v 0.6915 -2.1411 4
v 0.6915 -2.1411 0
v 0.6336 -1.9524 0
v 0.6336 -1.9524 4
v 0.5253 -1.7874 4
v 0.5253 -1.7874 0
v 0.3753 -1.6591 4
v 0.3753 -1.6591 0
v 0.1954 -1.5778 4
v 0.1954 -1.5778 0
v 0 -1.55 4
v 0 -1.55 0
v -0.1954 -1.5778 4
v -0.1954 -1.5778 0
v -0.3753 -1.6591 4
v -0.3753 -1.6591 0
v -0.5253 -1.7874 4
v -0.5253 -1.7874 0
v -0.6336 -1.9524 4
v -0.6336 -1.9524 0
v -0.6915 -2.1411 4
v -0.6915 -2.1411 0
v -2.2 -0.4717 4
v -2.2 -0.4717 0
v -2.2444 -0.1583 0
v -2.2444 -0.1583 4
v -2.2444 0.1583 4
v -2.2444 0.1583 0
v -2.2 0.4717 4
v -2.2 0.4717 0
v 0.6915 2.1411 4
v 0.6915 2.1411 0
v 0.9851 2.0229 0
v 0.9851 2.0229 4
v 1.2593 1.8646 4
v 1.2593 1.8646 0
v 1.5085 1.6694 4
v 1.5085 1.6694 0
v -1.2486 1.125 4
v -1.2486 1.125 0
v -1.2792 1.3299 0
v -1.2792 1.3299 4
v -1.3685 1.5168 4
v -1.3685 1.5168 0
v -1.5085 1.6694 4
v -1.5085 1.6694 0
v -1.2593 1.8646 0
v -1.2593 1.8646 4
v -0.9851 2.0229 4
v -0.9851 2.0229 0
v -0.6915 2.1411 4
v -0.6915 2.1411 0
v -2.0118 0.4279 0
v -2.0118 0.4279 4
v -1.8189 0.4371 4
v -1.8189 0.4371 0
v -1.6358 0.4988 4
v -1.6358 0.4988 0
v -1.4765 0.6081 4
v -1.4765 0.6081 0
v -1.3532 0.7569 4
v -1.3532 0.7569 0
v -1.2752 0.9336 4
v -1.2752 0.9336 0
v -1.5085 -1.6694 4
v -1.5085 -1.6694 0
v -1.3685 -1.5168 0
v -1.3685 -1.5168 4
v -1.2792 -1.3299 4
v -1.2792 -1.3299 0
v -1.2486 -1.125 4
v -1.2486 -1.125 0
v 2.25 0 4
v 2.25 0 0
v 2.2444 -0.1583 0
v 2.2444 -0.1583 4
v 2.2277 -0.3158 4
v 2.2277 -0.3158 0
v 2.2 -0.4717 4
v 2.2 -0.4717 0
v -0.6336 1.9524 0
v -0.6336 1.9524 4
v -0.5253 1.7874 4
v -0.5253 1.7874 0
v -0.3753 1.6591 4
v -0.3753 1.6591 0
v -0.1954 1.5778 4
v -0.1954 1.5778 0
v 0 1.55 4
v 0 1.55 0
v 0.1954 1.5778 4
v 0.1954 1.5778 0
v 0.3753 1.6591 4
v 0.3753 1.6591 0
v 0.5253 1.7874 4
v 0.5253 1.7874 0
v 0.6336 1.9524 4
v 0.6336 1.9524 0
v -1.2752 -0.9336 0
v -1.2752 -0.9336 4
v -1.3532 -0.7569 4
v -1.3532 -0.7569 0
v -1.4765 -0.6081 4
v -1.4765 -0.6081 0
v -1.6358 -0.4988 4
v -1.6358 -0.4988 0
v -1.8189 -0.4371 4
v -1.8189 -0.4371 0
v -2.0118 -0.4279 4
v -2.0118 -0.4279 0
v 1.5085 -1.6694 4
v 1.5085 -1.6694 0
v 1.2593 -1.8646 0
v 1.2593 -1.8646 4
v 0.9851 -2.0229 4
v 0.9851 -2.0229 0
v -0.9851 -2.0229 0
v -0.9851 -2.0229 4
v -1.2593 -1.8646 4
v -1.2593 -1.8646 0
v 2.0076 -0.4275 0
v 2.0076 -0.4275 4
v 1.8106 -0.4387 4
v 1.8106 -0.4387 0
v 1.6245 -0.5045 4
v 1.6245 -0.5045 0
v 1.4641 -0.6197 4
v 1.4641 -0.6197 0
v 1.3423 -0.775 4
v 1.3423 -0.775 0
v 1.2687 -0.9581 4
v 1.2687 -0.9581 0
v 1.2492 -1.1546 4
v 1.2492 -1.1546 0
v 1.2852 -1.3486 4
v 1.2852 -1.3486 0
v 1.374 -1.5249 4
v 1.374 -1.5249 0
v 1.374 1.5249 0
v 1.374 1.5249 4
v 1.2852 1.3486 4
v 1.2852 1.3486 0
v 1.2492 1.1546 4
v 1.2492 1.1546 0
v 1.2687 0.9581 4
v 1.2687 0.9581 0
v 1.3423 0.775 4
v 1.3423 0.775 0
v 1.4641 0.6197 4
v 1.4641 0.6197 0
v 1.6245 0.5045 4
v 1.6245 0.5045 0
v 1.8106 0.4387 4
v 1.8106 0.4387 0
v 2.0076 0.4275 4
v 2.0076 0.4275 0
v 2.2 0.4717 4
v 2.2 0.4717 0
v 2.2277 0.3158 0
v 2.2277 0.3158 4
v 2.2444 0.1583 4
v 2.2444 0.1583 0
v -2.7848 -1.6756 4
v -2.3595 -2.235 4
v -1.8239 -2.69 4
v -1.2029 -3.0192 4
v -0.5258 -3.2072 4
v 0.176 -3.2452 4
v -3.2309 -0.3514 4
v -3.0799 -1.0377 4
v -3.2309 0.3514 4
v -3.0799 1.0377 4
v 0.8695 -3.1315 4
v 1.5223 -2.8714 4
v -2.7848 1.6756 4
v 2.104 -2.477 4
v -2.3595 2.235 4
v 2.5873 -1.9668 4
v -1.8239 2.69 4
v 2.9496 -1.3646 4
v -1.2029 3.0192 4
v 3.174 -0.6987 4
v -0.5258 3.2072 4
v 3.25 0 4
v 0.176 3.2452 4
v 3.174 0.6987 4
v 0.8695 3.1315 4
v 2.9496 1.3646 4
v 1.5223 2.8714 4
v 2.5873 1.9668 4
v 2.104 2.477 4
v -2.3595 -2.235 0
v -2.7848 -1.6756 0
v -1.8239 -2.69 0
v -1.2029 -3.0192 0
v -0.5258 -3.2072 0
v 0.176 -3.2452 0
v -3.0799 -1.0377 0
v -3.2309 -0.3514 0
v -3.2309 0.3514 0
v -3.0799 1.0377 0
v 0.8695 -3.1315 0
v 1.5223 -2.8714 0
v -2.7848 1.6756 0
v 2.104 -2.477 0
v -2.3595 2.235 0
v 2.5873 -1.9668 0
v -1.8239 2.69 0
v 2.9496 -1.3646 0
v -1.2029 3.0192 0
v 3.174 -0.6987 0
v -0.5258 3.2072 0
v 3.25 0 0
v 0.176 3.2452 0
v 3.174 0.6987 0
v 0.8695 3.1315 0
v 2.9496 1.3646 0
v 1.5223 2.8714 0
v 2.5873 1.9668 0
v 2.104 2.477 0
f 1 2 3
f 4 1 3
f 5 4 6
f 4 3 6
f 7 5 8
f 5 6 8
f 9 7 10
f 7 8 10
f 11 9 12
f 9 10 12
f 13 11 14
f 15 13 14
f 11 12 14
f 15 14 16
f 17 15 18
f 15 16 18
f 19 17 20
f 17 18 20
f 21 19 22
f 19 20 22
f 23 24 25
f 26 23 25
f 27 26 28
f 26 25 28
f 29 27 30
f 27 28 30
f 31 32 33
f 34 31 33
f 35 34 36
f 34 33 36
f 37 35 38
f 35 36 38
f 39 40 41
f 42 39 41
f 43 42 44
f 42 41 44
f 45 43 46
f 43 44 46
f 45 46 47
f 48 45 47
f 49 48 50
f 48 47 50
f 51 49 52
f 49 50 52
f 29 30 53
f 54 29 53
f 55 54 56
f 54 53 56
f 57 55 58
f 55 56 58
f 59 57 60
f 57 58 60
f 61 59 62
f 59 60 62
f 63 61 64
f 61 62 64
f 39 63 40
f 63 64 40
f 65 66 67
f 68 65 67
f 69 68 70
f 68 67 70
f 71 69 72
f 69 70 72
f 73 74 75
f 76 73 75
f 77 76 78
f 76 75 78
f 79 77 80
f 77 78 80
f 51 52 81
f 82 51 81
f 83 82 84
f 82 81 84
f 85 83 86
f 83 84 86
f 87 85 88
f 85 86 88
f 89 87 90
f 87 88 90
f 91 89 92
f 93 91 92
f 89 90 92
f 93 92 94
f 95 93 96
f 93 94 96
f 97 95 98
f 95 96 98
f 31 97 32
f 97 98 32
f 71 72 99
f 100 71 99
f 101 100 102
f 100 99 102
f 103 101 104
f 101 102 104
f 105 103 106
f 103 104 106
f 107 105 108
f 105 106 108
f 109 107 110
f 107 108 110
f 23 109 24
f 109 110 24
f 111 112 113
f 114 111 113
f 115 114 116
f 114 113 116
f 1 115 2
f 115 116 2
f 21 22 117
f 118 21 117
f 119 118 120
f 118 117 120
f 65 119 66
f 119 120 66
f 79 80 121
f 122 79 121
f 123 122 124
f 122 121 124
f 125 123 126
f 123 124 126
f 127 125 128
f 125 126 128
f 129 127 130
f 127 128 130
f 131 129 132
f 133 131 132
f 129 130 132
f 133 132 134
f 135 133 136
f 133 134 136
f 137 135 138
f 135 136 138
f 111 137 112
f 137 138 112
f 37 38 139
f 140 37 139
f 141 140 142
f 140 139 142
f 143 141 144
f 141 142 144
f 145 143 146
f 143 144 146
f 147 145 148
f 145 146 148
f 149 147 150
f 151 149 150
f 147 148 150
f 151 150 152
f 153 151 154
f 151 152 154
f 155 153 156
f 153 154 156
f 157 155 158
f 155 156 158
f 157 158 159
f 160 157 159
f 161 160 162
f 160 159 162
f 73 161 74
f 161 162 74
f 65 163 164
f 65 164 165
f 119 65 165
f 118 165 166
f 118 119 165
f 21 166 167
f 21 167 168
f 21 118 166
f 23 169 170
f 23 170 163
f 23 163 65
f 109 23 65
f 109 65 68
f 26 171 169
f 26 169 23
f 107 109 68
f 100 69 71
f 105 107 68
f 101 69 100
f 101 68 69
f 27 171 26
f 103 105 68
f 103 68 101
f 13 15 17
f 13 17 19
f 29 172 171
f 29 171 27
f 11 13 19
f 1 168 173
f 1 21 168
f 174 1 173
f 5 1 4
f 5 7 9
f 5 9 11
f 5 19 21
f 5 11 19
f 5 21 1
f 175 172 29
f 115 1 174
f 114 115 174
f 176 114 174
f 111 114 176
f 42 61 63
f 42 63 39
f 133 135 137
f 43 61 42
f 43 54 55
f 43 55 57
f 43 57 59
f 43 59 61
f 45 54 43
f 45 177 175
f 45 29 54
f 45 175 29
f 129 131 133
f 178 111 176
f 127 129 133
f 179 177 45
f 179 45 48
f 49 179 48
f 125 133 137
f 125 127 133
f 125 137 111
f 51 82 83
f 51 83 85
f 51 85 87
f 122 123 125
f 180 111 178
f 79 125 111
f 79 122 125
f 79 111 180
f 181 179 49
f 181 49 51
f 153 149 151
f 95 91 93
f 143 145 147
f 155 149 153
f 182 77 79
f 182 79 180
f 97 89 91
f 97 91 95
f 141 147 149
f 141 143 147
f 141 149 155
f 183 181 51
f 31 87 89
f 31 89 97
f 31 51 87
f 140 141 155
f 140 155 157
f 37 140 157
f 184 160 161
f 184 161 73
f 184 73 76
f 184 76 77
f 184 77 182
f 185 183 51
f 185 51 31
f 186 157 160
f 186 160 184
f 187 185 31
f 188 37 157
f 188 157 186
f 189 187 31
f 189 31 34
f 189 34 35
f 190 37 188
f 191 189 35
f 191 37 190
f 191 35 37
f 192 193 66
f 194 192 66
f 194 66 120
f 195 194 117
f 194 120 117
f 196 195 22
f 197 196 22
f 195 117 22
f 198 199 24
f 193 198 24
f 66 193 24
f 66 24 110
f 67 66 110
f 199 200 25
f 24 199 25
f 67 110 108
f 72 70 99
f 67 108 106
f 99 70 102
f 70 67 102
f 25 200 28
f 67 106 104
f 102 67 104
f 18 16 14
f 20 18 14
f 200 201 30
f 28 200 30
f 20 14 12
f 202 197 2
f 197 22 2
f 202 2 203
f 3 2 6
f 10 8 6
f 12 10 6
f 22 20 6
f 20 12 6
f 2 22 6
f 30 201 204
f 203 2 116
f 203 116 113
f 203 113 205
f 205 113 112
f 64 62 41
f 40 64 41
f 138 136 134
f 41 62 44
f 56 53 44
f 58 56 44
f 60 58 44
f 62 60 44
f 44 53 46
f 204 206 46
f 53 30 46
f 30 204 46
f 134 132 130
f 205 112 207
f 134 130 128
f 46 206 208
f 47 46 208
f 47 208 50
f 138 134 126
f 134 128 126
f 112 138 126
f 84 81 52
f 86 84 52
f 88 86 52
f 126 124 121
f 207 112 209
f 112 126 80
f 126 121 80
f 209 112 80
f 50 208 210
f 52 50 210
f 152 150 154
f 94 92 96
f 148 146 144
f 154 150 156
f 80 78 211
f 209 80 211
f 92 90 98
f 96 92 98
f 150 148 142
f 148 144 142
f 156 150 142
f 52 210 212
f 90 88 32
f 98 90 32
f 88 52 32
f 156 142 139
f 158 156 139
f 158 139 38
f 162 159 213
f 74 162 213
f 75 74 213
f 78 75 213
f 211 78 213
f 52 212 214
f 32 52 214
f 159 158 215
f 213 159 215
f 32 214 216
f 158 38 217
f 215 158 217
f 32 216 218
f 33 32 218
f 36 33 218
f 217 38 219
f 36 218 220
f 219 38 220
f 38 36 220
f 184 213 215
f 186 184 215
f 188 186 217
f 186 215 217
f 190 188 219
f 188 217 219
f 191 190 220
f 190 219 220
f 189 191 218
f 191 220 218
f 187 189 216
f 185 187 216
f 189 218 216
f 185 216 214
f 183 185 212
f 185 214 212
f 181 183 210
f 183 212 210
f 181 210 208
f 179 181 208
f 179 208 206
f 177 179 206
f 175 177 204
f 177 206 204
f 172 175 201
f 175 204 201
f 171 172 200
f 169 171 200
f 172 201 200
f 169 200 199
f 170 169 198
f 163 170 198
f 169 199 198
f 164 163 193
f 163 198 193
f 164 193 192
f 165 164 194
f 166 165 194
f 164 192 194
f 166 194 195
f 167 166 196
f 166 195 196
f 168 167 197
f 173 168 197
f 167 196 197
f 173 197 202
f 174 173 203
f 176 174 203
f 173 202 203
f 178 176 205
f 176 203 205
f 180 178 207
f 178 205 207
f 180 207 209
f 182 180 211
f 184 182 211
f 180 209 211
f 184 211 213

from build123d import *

# Parameters (mm, degrees)
F0_R     = 3.25
F1_DEPTH = 4


with BuildPart() as f1:
    # F0 (on Top) → F1 (new body)
    with BuildSketch(Plane.XY):
        Circle(F0_R)
        with BuildLine():
            ThreePointArc((2.1999961154, 0.4717171738), (2.2374641069, 0.2371800374), (2.25, 0))
            ThreePointArc((2.25, 0), (2.2374641069, -0.2371800374), (2.1999961154, -0.4717171738))
            ThreePointArc((2.1999961154, -0.4717171738), (2.5256218299, -0.7287723318), (2.6485571585, -1.125))
            ThreePointArc((2.6485571585, -1.125), (2.2501959894, -1.7566755621), (1.5085171137, -1.6693939373))
            ThreePointArc((1.5085171137, -1.6693939373), (1.125, -1.9485571585), (0.6914790018, -2.1411111111))
            ThreePointArc((0.6914790018, -2.1411111111), (0.6978664991, -2.1953891093), (0.7, -2.25))
            ThreePointArc((0.7, -2.25), (-0.0546108907, -2.9478664991), (-0.6914790018, -2.1411111111))
            ThreePointArc((-0.6914790018, -2.1411111111), (-1.125, -1.9485571585), (-1.5085171137, -1.6693939373))
            ThreePointArc((-1.5085171137, -1.6693939373), (-2.5547749412, -1.475), (-2.1999961154, -0.4717171738))
            ThreePointArc((-2.1999961154, -0.4717171738), (-2.25, 0), (-2.1999961154, 0.4717171738))
            ThreePointArc((-2.1999961154, 0.4717171738), (-2.5547749412, 1.475), (-1.5085171137, 1.6693939373))
            ThreePointArc((-1.5085171137, 1.6693939373), (-1.125, 1.9485571585), (-0.6914790018, 2.1411111111))
            ThreePointArc((-0.6914790018, 2.1411111111), (-0.0546108907, 2.9478664991), (0.7, 2.25))
            ThreePointArc((0.7, 2.25), (0.6978664991, 2.1953891093), (0.6914790018, 2.1411111111))
            ThreePointArc((0.6914790018, 2.1411111111), (1.125, 1.9485571585), (1.5085171137, 1.6693939373))
            ThreePointArc((1.5085171137, 1.6693939373), (2.2501959894, 1.7566755621), (2.6485571585, 1.125))
            ThreePointArc((2.6485571585, 1.125), (2.5256218299, 0.7287723318), (2.1999961154, 0.4717171738))
        make_face(mode=Mode.SUBTRACT)
        with BuildLine():
            ThreePointArc((1.5085171137, 1.6693939373), (1.9485571585, 1.125), (2.1999961154, 0.4717171738))
            ThreePointArc((2.1999961154, 0.4717171738), (2.5256218299, 0.7287723318), (2.6485571585, 1.125))
            ThreePointArc((2.6485571585, 1.125), (2.2501959894, 1.7566755621), (1.5085171137, 1.6693939373))
        make_face()
        with BuildLine():
            ThreePointArc((2.6485571585, -1.125), (2.5256218299, -0.7287723318), (2.1999961154, -0.4717171738))
            ThreePointArc((2.1999961154, -0.4717171738), (1.9485571585, -1.125), (1.5085171137, -1.6693939373))
            ThreePointArc((1.5085171137, -1.6693939373), (2.2501959894, -1.7566755621), (2.6485571585, -1.125))
        make_face()
        with BuildLine():
            ThreePointArc((-0.6914790018, 2.1411111111), (0, 2.25), (0.6914790018, 2.1411111111))
            ThreePointArc((0.6914790018, 2.1411111111), (0.6978664991, 2.1953891093), (0.7, 2.25))
            ThreePointArc((0.7, 2.25), (-0.0546108907, 2.9478664991), (-0.6914790018, 2.1411111111))
        make_face()
        with BuildLine():
            ThreePointArc((0.7, -2.25), (0.6978664991, -2.1953891093), (0.6914790018, -2.1411111111))
            ThreePointArc((0.6914790018, -2.1411111111), (0, -2.25), (-0.6914790018, -2.1411111111))
            ThreePointArc((-0.6914790018, -2.1411111111), (-0.0546108907, -2.9478664991), (0.7, -2.25))
        make_face()
        with BuildLine():
            ThreePointArc((-2.1999961154, 0.4717171738), (-1.9485571585, 1.125), (-1.5085171137, 1.6693939373))
            ThreePointArc((-1.5085171137, 1.6693939373), (-2.5547749412, 1.475), (-2.1999961154, 0.4717171738))
        make_face()
        with BuildLine():
            ThreePointArc((-2.1999961154, -0.4717171738), (-2.5547749412, -1.475), (-1.5085171137, -1.6693939373))
            ThreePointArc((-1.5085171137, -1.6693939373), (-1.9485571585, -1.125), (-2.1999961154, -0.4717171738))
        make_face()
        with BuildLine():
            ThreePointArc((1.5085171137, 1.6693939373), (1.3423393759, 0.775), (2.1999961154, 0.4717171738))
            ThreePointArc((2.1999961154, 0.4717171738), (1.9485571585, 1.125), (1.5085171137, 1.6693939373))
        make_face()
        with BuildLine():
            ThreePointArc((1.5085171137, -1.6693939373), (1.9485571585, -1.125), (2.1999961154, -0.4717171738))
            ThreePointArc((2.1999961154, -0.4717171738), (1.3423393759, -0.775), (1.5085171137, -1.6693939373))
        make_face()
        with BuildLine():
            ThreePointArc((-0.6914790018, 2.1411111111), (0, 1.55), (0.6914790018, 2.1411111111))
            ThreePointArc((0.6914790018, 2.1411111111), (0, 2.25), (-0.6914790018, 2.1411111111))
        make_face()
        with BuildLine():
            ThreePointArc((-0.6914790018, -2.1411111111), (0, -2.25), (0.6914790018, -2.1411111111))
            ThreePointArc((0.6914790018, -2.1411111111), (0, -1.55), (-0.6914790018, -2.1411111111))
        make_face()
        with BuildLine():
            ThreePointArc((-1.2485571585, 1.125), (-1.3168815965, 1.4266388309), (-1.5085171137, 1.6693939373))
            ThreePointArc((-1.5085171137, 1.6693939373), (-1.9485571585, 1.125), (-2.1999961154, 0.4717171738))
            ThreePointArc((-2.1999961154, 0.4717171738), (-1.5523294903, 0.5479353287), (-1.2485571585, 1.125))
        make_face()
        with BuildLine():
            ThreePointArc((-2.1999961154, -0.4717171738), (-1.9485571585, -1.125), (-1.5085171137, -1.6693939373))
            ThreePointArc((-1.5085171137, -1.6693939373), (-1.3168815965, -1.4266388309), (-1.2485571585, -1.125))
            ThreePointArc((-1.2485571585, -1.125), (-1.5523294903, -0.5479353287), (-2.1999961154, -0.4717171738))
        make_face()
    extrude(amount=F1_DEPTH)


solid = f1.part
